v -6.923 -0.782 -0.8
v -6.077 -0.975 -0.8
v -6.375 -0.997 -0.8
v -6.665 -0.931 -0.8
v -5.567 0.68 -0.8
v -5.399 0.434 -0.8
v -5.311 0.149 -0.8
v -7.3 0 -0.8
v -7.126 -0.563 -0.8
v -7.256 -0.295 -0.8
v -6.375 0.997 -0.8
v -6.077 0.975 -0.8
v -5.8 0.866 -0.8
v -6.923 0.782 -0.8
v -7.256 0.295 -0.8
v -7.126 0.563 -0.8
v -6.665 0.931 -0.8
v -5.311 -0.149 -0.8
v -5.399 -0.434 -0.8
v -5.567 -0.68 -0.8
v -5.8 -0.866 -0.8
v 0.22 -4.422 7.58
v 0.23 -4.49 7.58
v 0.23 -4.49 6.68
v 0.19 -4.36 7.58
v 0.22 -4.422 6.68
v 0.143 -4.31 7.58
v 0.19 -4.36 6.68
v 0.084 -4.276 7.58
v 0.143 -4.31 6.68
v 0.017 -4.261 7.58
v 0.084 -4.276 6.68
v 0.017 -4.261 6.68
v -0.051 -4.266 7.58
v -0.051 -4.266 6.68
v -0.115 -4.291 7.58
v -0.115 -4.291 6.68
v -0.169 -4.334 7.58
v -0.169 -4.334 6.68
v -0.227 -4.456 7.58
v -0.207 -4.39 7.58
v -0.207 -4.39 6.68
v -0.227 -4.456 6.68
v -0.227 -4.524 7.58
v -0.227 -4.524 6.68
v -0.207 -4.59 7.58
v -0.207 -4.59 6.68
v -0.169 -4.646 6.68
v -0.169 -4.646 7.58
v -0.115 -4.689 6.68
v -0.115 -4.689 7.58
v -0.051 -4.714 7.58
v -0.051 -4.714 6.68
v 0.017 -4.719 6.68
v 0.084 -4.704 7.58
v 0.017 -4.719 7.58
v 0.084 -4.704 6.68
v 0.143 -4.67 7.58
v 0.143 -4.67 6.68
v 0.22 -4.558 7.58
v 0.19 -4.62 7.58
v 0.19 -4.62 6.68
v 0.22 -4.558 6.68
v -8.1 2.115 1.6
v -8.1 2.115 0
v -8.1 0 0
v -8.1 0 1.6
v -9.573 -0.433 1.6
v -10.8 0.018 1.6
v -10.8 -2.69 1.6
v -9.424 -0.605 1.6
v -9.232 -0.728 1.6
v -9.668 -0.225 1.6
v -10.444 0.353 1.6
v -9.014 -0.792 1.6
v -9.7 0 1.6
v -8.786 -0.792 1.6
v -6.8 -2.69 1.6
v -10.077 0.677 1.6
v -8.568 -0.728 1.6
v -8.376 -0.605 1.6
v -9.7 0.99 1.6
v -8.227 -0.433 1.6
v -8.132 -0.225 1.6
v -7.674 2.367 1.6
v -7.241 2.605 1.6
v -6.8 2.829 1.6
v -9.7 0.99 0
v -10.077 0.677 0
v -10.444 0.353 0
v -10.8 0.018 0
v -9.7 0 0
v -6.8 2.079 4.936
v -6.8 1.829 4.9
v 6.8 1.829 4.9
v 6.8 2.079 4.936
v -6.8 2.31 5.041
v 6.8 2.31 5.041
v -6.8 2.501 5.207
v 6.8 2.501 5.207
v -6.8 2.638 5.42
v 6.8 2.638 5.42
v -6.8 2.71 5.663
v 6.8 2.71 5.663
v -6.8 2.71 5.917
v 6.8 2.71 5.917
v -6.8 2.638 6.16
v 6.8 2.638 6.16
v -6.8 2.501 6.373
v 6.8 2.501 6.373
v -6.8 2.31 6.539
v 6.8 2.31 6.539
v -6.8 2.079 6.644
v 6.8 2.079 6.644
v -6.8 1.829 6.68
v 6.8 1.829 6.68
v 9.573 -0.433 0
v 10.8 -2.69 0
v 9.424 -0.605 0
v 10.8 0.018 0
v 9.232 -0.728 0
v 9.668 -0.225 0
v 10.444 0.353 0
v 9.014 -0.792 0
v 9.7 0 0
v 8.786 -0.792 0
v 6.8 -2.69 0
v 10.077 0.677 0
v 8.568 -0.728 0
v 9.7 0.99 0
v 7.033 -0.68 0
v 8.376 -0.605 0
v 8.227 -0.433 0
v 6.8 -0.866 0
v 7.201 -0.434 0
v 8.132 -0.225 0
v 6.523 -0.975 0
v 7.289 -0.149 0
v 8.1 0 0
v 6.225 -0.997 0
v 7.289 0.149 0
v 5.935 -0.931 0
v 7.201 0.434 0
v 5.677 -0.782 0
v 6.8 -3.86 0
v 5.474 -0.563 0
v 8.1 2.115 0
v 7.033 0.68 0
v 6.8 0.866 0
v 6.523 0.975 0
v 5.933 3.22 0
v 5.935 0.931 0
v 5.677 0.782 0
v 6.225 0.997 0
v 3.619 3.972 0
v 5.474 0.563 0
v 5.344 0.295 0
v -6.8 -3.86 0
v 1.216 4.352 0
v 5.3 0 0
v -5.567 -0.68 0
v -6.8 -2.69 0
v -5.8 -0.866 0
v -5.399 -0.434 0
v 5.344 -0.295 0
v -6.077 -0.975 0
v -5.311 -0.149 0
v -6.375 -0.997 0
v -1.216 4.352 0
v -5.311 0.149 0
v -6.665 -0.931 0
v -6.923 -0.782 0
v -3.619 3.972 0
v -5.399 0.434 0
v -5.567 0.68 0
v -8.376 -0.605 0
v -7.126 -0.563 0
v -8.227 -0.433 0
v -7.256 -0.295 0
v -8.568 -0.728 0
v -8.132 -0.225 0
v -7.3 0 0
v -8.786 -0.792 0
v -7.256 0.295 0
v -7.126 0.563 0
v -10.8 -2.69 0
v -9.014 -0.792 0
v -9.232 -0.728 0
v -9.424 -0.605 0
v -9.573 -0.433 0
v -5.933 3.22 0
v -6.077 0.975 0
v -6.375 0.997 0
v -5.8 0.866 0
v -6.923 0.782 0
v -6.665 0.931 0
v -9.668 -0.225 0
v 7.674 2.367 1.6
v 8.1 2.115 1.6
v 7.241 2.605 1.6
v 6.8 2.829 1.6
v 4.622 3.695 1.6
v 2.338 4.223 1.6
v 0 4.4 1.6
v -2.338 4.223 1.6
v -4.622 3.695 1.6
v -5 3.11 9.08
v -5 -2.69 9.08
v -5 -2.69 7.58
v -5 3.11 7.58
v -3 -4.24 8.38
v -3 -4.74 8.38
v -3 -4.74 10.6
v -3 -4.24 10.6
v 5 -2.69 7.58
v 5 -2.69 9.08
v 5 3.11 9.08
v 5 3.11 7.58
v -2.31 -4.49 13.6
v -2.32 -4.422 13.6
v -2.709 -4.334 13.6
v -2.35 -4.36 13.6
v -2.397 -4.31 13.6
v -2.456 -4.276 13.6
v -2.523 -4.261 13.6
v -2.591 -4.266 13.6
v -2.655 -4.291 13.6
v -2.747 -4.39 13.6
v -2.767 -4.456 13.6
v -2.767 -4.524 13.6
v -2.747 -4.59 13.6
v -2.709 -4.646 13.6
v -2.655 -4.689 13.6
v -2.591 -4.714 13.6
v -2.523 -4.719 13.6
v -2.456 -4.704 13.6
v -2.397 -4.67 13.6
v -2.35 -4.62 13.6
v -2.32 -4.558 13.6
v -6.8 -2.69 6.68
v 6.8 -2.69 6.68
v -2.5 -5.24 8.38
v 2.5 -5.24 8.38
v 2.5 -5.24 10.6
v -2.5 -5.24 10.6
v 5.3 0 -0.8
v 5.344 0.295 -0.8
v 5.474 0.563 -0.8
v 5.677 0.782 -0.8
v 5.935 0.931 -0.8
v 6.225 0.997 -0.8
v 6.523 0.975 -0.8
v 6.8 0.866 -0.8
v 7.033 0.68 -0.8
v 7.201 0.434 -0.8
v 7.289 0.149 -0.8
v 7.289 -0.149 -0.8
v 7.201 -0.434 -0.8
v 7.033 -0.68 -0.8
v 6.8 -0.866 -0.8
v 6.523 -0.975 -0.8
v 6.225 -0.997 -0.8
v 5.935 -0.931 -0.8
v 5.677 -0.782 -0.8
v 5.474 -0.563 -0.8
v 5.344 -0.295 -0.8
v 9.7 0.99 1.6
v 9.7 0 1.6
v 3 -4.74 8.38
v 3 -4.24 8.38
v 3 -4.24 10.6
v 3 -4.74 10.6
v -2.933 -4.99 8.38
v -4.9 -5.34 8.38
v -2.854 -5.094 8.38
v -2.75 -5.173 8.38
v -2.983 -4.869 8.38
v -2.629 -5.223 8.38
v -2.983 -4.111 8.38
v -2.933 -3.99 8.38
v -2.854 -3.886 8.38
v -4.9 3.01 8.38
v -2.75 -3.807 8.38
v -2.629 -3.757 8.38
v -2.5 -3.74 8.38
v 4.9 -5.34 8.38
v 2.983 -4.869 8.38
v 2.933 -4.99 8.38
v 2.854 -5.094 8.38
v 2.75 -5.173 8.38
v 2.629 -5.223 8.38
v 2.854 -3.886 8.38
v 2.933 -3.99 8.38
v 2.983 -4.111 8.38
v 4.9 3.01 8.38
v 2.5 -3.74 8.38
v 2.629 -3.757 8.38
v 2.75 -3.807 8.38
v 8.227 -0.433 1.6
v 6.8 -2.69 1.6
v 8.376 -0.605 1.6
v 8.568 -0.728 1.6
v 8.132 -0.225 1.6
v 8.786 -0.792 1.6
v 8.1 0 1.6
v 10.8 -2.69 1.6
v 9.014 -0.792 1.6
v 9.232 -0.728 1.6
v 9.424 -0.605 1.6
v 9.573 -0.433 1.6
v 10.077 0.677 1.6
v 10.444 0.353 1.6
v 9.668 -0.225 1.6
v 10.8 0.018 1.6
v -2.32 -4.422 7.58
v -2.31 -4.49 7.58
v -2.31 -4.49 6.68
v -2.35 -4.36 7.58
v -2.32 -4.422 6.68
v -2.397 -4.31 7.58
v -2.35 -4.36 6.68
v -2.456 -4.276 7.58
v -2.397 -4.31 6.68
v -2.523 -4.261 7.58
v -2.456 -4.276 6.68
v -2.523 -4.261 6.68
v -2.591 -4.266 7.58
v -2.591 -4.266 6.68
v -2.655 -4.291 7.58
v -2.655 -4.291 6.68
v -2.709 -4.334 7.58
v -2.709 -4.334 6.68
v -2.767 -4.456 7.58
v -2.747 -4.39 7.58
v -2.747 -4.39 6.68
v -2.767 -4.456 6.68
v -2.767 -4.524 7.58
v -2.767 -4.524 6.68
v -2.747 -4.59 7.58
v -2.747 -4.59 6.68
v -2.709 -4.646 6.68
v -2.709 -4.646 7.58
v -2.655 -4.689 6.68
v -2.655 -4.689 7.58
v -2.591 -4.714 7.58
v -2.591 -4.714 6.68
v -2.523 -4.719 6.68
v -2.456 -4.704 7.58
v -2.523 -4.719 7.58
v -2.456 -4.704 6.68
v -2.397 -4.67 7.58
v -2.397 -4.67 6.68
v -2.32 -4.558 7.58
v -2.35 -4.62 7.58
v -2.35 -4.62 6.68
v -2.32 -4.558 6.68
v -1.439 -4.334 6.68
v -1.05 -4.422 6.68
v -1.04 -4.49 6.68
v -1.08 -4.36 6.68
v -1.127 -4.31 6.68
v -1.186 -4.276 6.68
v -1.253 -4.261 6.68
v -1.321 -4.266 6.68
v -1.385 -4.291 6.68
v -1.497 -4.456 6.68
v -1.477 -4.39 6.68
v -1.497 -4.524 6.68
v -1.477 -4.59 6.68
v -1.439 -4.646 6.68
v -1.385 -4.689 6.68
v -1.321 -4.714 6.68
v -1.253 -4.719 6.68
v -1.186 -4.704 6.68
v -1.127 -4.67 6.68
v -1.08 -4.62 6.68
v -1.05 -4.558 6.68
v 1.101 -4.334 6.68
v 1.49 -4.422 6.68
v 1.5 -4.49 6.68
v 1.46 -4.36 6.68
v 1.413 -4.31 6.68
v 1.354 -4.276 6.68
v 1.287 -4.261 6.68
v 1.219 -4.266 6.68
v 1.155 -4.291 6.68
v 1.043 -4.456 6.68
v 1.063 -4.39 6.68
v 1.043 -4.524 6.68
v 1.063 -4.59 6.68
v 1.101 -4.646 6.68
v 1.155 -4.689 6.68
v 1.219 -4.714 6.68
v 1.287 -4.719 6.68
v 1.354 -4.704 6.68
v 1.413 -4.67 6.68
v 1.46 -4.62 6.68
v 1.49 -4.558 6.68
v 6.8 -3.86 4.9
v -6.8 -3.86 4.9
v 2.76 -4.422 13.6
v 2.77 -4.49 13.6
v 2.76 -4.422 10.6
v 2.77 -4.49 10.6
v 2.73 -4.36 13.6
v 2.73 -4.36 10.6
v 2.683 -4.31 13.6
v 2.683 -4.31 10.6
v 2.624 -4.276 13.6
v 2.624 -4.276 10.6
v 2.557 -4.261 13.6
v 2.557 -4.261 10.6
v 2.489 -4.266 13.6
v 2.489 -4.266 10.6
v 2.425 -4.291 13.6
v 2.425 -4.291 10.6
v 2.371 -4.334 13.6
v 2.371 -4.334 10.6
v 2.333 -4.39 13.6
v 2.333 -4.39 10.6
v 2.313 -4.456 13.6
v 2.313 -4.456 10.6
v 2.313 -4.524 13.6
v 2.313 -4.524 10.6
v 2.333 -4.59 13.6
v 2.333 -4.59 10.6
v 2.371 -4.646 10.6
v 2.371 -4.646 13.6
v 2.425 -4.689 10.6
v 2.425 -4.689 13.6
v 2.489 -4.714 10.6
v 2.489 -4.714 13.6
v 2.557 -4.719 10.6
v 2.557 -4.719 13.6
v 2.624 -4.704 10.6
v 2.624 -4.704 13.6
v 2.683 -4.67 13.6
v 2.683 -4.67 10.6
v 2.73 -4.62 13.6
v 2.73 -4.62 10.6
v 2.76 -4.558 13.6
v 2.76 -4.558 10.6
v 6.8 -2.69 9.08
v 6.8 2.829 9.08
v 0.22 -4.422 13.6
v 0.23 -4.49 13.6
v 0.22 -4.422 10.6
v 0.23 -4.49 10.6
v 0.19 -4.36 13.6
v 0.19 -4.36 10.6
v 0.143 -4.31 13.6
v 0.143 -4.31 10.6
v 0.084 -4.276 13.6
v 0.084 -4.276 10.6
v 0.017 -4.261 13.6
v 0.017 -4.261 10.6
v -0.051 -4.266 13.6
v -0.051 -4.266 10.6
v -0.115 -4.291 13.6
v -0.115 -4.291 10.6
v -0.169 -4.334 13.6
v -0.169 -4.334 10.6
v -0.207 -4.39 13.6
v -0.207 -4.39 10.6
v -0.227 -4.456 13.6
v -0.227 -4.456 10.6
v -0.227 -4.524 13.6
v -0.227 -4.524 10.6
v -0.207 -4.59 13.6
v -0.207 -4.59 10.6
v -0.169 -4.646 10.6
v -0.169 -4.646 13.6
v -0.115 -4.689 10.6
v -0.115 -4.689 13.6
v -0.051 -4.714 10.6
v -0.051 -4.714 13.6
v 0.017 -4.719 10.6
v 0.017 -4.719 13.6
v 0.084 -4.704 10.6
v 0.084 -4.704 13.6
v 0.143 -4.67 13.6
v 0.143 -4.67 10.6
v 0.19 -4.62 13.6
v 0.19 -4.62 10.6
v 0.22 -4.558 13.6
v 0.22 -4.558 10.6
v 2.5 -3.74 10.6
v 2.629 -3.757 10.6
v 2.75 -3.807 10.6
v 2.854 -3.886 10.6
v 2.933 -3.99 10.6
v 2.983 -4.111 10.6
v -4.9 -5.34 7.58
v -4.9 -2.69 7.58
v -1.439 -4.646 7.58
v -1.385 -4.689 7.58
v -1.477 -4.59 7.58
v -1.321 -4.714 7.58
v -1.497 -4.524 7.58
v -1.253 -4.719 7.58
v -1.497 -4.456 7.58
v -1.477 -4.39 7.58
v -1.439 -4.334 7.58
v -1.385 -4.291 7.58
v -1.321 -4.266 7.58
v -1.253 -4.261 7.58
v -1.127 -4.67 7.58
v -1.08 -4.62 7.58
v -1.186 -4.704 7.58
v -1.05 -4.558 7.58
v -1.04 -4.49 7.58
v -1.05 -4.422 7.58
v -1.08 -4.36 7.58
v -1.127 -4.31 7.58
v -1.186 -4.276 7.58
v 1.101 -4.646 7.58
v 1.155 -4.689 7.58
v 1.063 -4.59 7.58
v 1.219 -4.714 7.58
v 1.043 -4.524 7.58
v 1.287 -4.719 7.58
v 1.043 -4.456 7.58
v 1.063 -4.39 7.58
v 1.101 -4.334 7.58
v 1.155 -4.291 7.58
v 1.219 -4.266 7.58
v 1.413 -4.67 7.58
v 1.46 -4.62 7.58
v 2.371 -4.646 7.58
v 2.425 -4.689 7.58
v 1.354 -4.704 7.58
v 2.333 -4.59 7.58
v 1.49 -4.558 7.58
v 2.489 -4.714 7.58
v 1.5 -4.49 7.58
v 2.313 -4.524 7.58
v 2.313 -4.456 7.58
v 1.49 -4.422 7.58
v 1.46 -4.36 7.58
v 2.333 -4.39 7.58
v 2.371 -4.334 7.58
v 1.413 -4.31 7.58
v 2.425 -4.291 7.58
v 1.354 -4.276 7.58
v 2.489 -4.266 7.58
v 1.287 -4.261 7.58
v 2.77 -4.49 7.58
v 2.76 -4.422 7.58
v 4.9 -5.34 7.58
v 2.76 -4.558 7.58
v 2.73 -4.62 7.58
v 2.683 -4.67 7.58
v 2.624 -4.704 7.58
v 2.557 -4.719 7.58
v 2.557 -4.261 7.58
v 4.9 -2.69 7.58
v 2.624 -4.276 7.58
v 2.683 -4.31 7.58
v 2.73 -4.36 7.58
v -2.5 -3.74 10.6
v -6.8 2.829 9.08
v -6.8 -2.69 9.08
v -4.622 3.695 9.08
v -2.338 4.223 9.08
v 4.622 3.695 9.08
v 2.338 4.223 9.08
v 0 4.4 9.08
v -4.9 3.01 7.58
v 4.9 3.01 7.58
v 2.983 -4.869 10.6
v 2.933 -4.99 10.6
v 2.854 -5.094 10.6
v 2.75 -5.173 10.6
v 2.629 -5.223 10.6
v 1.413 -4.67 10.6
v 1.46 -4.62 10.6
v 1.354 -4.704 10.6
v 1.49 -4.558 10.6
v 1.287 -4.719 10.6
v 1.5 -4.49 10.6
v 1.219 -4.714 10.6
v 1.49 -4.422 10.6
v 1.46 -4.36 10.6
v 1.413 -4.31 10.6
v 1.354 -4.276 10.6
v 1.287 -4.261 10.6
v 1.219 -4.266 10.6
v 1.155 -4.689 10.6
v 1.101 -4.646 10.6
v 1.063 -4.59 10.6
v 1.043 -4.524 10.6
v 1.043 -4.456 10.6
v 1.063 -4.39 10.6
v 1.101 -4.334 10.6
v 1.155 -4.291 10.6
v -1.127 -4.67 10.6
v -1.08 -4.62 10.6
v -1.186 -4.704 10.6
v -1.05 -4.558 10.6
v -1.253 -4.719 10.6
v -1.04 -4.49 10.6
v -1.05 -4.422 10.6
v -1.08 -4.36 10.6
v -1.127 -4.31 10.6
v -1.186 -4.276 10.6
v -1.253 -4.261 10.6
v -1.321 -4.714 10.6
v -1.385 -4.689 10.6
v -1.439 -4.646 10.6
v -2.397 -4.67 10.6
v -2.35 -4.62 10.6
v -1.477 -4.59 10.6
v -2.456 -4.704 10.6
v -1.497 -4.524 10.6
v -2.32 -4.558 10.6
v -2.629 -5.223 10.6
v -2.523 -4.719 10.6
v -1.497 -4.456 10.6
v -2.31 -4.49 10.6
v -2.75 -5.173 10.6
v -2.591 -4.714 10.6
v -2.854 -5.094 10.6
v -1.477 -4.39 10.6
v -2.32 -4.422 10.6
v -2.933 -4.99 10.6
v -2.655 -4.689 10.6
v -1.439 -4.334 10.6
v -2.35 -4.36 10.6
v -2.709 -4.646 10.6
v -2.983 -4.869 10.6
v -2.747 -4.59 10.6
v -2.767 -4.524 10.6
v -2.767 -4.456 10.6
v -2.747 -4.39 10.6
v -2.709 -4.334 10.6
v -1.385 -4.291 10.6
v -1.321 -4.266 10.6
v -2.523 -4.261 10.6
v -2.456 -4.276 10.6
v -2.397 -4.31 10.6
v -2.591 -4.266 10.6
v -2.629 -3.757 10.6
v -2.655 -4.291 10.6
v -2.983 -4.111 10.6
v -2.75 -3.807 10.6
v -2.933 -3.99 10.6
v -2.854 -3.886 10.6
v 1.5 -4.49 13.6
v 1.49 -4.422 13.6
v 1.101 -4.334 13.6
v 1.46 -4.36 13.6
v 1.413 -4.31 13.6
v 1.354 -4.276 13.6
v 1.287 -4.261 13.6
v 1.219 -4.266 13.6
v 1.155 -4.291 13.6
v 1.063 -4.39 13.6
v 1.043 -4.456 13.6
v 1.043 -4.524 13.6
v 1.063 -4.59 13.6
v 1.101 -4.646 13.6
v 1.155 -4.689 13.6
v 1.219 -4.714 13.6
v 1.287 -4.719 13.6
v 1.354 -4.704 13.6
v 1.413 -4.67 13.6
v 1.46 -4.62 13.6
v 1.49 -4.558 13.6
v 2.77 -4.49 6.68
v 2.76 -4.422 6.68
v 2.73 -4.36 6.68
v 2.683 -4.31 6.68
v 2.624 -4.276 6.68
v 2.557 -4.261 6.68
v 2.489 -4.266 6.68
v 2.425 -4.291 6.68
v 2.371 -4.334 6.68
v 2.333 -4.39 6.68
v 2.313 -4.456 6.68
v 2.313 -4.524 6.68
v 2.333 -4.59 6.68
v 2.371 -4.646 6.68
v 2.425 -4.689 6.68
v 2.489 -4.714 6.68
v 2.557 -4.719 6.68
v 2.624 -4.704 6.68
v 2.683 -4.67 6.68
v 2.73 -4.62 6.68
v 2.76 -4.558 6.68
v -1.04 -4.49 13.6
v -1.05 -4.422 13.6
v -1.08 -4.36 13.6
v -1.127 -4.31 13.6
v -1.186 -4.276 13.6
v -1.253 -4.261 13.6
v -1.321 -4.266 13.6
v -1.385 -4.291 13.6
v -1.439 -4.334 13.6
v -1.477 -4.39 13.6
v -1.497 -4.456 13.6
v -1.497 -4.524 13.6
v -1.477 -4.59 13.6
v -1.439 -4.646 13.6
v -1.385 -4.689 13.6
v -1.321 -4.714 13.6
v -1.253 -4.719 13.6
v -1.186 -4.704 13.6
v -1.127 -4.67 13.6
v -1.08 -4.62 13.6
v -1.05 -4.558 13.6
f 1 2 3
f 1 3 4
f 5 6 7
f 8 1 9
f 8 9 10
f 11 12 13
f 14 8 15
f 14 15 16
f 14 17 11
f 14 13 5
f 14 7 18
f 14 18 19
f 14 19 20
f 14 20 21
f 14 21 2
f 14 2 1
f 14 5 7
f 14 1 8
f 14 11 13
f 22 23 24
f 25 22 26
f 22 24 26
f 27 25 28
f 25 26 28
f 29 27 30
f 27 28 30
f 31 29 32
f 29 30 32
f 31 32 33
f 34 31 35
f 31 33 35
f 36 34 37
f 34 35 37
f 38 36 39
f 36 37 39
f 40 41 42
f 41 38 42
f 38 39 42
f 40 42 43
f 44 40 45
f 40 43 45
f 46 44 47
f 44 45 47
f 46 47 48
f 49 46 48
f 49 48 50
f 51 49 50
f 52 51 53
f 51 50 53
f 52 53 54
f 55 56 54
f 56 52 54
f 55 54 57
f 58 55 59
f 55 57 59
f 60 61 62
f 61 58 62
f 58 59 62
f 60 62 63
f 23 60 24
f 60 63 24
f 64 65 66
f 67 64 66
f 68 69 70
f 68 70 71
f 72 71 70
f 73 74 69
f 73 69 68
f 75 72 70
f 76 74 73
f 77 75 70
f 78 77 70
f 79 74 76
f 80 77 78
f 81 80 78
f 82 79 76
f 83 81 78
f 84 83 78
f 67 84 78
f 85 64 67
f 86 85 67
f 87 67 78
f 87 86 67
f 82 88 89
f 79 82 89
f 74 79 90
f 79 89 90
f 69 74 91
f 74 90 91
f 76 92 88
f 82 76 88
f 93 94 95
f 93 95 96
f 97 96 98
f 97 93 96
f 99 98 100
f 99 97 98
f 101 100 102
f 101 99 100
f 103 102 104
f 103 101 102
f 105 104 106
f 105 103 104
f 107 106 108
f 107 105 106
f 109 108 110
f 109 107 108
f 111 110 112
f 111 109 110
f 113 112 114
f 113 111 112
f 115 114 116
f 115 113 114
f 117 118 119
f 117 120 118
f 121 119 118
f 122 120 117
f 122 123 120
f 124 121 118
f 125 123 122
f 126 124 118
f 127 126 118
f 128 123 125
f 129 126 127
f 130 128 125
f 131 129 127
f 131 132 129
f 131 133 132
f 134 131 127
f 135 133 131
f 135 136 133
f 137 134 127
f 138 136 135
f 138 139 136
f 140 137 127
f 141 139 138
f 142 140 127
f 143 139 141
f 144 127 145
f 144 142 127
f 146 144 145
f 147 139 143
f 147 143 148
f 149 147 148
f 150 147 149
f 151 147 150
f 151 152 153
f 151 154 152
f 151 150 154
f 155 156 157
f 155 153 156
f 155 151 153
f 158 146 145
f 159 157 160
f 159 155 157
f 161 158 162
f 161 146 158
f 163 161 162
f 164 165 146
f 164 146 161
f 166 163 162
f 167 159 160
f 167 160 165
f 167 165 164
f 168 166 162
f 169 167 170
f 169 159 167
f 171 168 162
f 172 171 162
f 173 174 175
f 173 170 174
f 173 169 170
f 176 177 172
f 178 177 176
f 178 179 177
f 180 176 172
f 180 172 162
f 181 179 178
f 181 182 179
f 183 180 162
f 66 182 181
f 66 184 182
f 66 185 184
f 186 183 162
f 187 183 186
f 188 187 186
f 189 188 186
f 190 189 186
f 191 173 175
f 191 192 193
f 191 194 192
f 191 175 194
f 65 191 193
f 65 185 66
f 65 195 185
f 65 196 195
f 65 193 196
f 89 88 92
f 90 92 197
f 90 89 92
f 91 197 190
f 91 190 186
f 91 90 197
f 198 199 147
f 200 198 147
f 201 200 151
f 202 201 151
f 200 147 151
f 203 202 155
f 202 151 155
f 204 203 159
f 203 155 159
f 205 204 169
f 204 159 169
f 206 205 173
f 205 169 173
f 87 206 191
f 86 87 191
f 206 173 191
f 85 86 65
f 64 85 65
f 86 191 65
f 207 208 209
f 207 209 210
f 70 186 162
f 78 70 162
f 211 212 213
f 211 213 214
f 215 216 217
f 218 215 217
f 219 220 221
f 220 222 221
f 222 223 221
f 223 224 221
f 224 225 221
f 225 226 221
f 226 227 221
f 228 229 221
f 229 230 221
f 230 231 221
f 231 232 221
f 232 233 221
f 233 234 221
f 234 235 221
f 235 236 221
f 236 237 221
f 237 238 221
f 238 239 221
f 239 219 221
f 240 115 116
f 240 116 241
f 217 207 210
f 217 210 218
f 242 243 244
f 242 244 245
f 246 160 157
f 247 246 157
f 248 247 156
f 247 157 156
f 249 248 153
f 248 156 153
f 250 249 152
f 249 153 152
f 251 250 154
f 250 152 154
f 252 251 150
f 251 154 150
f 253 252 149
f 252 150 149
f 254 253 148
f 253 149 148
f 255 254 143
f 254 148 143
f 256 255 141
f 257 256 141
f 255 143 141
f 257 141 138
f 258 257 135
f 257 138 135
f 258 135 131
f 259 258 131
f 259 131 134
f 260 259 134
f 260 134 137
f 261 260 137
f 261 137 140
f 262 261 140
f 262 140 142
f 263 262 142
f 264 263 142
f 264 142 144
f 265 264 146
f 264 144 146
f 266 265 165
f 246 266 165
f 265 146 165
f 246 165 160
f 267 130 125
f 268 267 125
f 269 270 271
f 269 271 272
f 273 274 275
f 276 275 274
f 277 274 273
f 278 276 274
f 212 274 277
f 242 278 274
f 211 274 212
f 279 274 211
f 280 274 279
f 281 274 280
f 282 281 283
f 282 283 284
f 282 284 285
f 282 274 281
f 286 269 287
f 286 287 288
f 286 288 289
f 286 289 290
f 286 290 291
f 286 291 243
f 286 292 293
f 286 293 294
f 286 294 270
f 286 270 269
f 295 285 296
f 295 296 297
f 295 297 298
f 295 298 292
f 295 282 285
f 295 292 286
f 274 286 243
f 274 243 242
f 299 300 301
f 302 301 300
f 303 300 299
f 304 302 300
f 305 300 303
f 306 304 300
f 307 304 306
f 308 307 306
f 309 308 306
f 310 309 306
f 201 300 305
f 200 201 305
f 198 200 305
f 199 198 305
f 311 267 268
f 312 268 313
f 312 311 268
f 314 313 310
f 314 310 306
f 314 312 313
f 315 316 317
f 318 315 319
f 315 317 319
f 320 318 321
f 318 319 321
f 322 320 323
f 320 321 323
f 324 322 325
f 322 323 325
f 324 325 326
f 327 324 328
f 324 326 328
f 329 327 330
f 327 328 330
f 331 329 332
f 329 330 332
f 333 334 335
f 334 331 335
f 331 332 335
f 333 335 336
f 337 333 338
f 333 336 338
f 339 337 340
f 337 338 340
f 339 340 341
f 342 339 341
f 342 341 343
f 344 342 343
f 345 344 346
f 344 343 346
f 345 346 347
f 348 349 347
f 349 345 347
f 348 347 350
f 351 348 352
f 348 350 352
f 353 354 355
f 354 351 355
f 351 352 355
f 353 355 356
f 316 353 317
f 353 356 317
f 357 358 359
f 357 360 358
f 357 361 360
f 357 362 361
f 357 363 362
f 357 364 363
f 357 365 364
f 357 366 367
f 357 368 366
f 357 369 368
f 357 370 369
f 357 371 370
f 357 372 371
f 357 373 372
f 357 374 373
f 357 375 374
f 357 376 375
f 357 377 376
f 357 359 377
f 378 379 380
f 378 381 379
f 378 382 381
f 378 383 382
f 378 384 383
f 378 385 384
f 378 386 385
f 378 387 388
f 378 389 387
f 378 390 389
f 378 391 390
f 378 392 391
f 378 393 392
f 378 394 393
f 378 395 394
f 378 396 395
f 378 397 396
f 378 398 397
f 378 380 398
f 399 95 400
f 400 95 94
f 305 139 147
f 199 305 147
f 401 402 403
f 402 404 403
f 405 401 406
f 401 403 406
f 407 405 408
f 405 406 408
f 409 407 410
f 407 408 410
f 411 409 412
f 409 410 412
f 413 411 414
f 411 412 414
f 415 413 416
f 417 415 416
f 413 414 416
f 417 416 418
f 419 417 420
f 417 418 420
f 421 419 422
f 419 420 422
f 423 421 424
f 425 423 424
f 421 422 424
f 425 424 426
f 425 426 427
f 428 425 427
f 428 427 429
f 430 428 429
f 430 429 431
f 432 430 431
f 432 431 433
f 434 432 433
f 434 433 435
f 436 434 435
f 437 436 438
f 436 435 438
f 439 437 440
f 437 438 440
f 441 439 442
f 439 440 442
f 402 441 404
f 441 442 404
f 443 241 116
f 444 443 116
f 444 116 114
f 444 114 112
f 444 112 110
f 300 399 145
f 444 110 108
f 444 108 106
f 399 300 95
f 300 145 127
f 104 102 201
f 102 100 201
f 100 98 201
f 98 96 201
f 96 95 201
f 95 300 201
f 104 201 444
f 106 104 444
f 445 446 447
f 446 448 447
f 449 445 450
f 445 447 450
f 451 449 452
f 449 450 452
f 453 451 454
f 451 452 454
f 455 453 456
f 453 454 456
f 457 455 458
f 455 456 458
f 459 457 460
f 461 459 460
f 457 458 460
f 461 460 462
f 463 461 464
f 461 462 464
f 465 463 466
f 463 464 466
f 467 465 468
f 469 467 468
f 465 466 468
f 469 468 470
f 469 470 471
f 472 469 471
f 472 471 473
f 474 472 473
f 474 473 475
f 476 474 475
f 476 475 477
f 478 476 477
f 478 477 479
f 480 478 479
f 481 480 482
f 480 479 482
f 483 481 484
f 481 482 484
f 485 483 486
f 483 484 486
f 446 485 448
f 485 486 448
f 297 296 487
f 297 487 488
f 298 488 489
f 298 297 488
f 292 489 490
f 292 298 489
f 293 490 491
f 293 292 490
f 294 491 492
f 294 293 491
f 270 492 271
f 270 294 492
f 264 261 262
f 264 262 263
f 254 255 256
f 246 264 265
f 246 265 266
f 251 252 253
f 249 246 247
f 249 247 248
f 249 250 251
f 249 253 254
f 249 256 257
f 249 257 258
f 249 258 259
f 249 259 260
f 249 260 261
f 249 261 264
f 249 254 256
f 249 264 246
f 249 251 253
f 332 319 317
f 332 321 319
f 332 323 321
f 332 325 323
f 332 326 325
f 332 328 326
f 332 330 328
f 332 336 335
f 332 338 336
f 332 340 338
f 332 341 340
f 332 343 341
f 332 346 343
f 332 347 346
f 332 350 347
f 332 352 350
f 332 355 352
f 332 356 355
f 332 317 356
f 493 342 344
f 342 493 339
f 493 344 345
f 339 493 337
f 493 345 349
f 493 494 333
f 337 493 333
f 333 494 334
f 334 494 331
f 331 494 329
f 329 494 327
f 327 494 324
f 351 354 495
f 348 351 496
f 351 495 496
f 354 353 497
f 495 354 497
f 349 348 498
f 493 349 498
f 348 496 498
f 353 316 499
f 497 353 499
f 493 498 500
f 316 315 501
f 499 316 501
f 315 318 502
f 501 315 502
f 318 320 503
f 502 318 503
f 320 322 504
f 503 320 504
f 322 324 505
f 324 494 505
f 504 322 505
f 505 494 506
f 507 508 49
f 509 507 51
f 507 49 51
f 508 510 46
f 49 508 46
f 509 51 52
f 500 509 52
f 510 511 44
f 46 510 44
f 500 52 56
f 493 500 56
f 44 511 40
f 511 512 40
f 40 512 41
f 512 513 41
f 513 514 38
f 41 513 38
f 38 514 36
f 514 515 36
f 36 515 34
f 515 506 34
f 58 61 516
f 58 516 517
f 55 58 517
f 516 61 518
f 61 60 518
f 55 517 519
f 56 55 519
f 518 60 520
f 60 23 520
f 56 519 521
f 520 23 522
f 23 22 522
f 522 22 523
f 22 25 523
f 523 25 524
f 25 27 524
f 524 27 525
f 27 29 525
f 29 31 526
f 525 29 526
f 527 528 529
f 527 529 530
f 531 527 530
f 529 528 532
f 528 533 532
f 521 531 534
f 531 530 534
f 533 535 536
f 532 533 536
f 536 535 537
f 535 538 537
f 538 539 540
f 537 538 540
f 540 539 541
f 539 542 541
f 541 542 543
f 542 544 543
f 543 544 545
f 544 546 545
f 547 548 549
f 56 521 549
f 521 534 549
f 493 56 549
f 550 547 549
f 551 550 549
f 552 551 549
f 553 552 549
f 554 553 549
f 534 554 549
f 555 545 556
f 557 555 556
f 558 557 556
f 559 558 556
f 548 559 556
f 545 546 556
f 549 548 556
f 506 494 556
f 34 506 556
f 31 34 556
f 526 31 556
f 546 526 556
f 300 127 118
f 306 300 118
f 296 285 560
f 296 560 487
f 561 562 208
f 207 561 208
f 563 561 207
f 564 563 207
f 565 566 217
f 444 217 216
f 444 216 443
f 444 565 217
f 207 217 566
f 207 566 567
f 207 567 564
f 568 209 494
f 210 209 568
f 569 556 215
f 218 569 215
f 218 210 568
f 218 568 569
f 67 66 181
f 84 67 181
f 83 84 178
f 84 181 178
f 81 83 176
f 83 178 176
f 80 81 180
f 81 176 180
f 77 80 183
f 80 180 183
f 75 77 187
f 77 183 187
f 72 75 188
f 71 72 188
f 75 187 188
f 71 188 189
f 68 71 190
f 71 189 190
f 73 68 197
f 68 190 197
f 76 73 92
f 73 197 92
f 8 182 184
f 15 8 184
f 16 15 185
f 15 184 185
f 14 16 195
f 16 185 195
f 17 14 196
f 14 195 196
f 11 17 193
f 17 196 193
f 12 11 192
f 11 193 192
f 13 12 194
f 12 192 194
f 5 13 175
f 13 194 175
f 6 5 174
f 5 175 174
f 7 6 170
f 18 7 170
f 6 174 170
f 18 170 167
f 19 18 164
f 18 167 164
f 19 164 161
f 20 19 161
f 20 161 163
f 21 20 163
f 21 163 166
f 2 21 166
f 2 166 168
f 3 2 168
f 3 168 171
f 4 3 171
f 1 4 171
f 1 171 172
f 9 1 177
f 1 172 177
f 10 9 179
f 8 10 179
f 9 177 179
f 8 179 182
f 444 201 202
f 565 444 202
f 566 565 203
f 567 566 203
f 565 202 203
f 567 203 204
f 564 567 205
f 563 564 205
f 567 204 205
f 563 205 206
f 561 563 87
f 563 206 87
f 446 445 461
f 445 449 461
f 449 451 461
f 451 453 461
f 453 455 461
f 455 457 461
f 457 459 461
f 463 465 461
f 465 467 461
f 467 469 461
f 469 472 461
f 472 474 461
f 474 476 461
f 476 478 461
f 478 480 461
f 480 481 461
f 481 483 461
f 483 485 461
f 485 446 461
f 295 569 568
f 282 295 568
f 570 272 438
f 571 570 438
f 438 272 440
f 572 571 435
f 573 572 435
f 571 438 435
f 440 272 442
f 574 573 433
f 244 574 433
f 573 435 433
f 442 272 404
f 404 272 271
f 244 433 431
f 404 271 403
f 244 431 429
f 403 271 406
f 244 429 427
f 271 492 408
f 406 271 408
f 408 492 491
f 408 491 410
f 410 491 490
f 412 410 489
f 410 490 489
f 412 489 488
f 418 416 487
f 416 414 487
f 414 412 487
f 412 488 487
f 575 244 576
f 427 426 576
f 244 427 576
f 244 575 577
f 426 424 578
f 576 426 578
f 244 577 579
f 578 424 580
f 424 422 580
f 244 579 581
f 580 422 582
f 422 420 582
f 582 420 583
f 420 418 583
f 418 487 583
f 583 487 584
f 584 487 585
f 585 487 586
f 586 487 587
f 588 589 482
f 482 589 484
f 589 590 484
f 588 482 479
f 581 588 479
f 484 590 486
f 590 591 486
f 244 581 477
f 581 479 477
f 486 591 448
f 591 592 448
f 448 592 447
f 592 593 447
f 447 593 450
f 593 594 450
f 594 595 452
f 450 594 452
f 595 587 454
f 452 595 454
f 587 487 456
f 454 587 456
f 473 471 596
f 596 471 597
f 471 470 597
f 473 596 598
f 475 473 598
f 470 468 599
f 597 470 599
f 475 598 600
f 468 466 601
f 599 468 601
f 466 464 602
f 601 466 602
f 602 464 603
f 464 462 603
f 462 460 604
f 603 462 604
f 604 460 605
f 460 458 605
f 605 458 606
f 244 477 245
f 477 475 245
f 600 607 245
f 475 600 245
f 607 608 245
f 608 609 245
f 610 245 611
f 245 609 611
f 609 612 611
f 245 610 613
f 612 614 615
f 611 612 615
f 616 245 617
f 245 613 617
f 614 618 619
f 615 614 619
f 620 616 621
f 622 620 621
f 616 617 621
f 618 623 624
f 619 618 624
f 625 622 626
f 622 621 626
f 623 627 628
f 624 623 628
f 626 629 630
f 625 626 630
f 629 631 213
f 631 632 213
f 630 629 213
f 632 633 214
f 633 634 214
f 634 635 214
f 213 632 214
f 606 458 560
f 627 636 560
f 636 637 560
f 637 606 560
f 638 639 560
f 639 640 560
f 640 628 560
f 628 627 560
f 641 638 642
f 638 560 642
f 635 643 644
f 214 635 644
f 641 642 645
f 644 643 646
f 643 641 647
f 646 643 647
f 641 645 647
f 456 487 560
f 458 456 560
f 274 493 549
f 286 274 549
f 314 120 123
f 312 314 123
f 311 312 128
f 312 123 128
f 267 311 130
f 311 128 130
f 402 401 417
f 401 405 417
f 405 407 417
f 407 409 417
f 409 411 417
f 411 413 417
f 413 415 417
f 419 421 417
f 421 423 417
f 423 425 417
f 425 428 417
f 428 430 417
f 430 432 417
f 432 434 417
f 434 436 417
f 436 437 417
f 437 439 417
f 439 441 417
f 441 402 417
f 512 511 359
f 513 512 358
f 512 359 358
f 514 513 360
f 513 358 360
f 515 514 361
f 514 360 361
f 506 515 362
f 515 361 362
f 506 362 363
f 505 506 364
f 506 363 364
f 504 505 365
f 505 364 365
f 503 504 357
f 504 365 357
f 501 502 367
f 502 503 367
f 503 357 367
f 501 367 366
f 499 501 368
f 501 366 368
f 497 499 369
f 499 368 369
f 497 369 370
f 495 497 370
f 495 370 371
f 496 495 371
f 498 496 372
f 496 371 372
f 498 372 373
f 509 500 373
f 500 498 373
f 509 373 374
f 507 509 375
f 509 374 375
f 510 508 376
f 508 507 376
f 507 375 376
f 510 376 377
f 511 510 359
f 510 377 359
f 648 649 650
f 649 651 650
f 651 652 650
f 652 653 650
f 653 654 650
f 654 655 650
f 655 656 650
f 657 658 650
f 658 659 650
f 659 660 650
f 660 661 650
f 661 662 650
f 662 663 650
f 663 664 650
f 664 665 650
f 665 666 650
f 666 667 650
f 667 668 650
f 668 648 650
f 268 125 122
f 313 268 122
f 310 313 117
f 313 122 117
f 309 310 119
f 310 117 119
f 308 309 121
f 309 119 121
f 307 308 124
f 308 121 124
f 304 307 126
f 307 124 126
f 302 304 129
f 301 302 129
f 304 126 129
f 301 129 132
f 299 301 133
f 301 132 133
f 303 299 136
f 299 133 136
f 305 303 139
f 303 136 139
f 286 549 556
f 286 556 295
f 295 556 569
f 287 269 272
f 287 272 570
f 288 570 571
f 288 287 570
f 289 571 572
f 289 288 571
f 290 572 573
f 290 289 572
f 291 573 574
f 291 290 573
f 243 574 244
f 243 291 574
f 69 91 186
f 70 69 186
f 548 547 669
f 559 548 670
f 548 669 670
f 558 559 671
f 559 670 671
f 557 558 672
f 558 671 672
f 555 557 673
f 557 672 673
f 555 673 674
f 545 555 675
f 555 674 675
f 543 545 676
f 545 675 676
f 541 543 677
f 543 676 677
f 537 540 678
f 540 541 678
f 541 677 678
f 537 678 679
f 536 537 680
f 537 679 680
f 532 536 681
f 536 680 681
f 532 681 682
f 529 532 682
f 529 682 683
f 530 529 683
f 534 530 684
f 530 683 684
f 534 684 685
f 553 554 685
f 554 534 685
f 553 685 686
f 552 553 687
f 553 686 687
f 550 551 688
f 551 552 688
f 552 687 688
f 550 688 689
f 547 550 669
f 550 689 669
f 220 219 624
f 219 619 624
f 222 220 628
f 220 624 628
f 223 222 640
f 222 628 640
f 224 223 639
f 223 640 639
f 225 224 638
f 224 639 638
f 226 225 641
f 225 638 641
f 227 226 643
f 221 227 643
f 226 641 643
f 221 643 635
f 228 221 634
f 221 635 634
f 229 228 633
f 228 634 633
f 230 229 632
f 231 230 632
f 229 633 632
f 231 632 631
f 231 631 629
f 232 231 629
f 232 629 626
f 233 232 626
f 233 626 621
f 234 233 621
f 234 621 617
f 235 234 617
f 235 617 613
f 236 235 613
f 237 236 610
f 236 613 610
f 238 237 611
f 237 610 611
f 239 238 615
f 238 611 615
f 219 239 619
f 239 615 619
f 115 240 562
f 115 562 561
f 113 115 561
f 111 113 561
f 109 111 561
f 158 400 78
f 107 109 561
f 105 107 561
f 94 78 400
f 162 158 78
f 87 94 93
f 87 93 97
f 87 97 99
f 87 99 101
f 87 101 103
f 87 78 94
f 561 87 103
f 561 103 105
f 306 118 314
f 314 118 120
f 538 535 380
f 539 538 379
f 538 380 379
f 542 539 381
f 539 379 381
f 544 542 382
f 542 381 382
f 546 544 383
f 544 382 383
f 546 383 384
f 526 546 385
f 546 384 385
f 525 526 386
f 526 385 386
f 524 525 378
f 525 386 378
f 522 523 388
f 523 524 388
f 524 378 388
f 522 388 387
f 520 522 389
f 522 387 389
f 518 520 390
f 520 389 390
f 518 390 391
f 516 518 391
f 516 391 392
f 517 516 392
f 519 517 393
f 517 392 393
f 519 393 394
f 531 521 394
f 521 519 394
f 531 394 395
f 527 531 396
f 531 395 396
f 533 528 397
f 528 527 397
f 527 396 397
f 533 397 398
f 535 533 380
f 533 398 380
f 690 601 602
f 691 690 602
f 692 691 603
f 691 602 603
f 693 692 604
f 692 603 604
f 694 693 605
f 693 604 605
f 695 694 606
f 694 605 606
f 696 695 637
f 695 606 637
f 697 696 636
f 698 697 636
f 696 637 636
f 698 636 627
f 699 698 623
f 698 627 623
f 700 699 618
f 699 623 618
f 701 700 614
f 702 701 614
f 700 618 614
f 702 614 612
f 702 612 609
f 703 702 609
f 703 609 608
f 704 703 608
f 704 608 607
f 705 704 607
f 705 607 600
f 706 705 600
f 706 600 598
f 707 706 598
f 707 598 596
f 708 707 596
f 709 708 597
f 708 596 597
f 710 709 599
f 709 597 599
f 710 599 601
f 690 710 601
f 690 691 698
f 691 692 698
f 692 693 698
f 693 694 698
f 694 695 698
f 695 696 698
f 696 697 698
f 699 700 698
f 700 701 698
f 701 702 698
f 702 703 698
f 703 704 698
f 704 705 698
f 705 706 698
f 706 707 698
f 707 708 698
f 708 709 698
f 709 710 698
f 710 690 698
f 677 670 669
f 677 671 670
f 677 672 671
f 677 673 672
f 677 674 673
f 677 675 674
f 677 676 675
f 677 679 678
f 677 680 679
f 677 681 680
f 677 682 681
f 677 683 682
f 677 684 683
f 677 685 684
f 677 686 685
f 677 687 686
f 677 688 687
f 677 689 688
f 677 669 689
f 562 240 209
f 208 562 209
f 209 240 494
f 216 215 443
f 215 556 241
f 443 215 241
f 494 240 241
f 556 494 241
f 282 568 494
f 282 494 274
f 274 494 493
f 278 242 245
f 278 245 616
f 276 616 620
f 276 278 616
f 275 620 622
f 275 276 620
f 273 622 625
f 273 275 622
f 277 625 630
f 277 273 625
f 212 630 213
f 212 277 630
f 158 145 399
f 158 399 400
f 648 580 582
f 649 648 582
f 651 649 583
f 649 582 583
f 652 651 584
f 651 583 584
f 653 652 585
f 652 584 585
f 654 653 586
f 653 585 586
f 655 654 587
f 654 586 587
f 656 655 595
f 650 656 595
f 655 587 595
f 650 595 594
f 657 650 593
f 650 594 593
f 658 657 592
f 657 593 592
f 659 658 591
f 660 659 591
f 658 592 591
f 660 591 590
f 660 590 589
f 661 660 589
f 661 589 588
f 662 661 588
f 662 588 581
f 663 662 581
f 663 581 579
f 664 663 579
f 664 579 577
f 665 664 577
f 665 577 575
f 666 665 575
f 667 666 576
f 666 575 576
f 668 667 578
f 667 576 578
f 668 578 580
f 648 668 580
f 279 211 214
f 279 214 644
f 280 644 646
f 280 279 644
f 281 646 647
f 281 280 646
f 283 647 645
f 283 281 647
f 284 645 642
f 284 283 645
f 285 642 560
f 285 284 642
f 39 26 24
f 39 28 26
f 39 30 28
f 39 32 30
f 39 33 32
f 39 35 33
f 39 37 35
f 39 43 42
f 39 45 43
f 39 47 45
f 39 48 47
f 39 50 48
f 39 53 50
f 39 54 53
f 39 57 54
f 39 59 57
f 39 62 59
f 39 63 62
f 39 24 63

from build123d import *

# Parameters (mm, degrees)
BOSS_EXTRU_1_DEPTH           = 1.6
BOSS_EXTRU_2_DEPTH           = 7.48
ESQUISSE3_W                  = 10
ESQUISSE3_H                  = 5.8
ENL_V_MAT_EXTRU_2_DEPTH      = 1.5
ENL_V_MAT_EXTRU_3_DEPTH      = 18.6
ESQUISSE5_R                  = 1
BOSS_EXTRU_3_DEPTH           = 0.8
ESQUISSE8_W                  = 0.23
ESQUISSE8_H                  = 6.92
R_P_TITION_LIN_AIRE1_COUNT   = 3
R_P_TITION_LIN_AIRE1_PITCH   = 1.27
R_P_TITION_LIN_AIRE1_2_COUNT = 3
R_P_TITION_LIN_AIRE1_2_PITCH = 1.27
BOSS_EXTRU_4_DEPTH           = 0.8
ESQUISSE11_W                 = 13.6
ESQUISSE11_H                 = 1.17
BOSS_EXTRU_5_DEPTH           = 4.9
BOSS_EXTRU_6_DEPTH           = 2.22


with BuildPart() as part:
    # Esquisse1 → Boss.-Extru.1 (new body)
    with BuildSketch(Plane.XY):
        with BuildLine():
            Line((-10.8, 0.018003418), (-10.8, -2.69))
            Line((-10.8, -2.69), (10.8, -2.69))
            Line((10.8, -2.69), (10.8, 0.018003418))
            ThreePointArc((10.8, 0.018003418), (10.261507275, 0.516861385), (9.7, 0.989665008))
            Line((9.7, 0.989665008), (9.7, 0))
            ThreePointArc((9.7, 0), (8.9, -0.8), (8.1, 0))
            Line((8.1, 0), (8.1, 2.115142829))
            ThreePointArc((8.1, 2.115142829), (0, 4.4), (-8.1, 2.115142829))
            Line((-8.1, 2.115142829), (-8.1, 0))
            ThreePointArc((-8.1, 0), (-8.9, -0.8), (-9.7, 0))
            Line((-9.7, 0), (-9.7, 0.989665008))
            ThreePointArc((-9.7, 0.989665008), (-10.261507275, 0.516861385), (-10.8, 0.018003418))
        make_face()
    extrude(amount=BOSS_EXTRU_1_DEPTH)

    # Esquisse2 → Boss.-Extru.2 (add)
    with BuildSketch(Plane.XY.offset(1.6)):
        with BuildLine():
            Line((-6.8, 2.828747252), (-6.8, -2.69))
            Line((-6.8, -2.69), (6.8, -2.69))
            Line((6.8, -2.69), (6.8, 2.828747252))
            ThreePointArc((6.8, 2.828747252), (0, 4.4), (-6.8, 2.828747252))
        make_face()
    extrude(amount=BOSS_EXTRU_2_DEPTH)

    # Esquisse3 → Enlèv. mat.-Extru.2 (cut)
    with BuildSketch(Plane.XY.offset(9.08)):
        with Locations((0, 0.21)):
            Rectangle(ESQUISSE3_W, ESQUISSE3_H)
    extrude(amount=-ENL_V_MAT_EXTRU_2_DEPTH, mode=Mode.SUBTRACT)

    # Esquisse4 → Enlèv. mat.-Extru.3 (cut, through all)
    with BuildSketch(Plane.ZY.offset(6.8)):
        with BuildLine():
            Line((4.9, -2.69), (4.9, 1.828747252))
            ThreePointArc((4.9, 1.828747252), (5.79, 2.718747252), (6.68, 1.828747252))
            Line((6.68, 1.828747252), (6.68, -2.69))
            ThreePointArc((6.68, -2.69), (5.79, -3.58), (4.9, -2.69))
        make_face()
    extrude(amount=-ENL_V_MAT_EXTRU_3_DEPTH, mode=Mode.SUBTRACT)

    # Esquisse5 → Boss.-Extru.3 (add)
    with BuildSketch(Plane(origin=(0, 0, 0), x_dir=(-1, 0, 0), z_dir=(0, 0, -1))):
        with Locations((6.3, 0)):
            Circle(ESQUISSE5_R)
        with Locations((-6.3, 0)):
            Circle(ESQUISSE5_R)
    extrude(amount=BOSS_EXTRU_3_DEPTH)



with BuildPart() as body_2:
    # Esquisse8 → Révolution1 (revolve)
    with BuildSketch(Plane(origin=(0, -4.49, 0), x_dir=(1, 0, 0), z_dir=(0, 1, 0))):
        with Locations((0.115, -10.14)):
            Rectangle(ESQUISSE8_W, ESQUISSE8_H)
    revolve(axis=Axis((0, -4.49, 7.58), (0, 0, 1)))


with BuildPart() as r_p_tition_lin_aire1_1:
    # Répétition linéaire1: pattern copy
    add(body_2.part.moved(Location(Vector(1, 0, 0) * (1 * R_P_TITION_LIN_AIRE1_PITCH))))


with BuildPart() as r_p_tition_lin_aire1_2:
    # Répétition linéaire1: pattern copy
    add(body_2.part.moved(Location(Vector(1, 0, 0) * (2 * R_P_TITION_LIN_AIRE1_PITCH))))


with BuildPart() as r_p_tition_lin_aire1_2_1:
    # R_p_tition lin_aire1 2: pattern copy
    add(body_2.part.moved(Location(Vector(-1, 0, 0) * (1 * R_P_TITION_LIN_AIRE1_2_PITCH))))


with BuildPart() as r_p_tition_lin_aire1_2_2:
    # R_p_tition lin_aire1 2: pattern copy
    add(body_2.part.moved(Location(Vector(-1, 0, 0) * (2 * R_P_TITION_LIN_AIRE1_2_PITCH))))


with BuildPart() as r_p_tition_lin_aire1_2_3:
    # R_p_tition lin_aire1 2: pattern copy
    add(r_p_tition_lin_aire1_1.part.moved(Location(Vector(-1, 0, 0) * (1 * R_P_TITION_LIN_AIRE1_2_PITCH))))


with BuildPart() as r_p_tition_lin_aire1_2_4:
    # R_p_tition lin_aire1 2: pattern copy
    add(r_p_tition_lin_aire1_1.part.moved(Location(Vector(-1, 0, 0) * (2 * R_P_TITION_LIN_AIRE1_2_PITCH))))


with BuildPart() as r_p_tition_lin_aire1_2_5:
    # R_p_tition lin_aire1 2: pattern copy
    add(r_p_tition_lin_aire1_2.part.moved(Location(Vector(-1, 0, 0) * (1 * R_P_TITION_LIN_AIRE1_2_PITCH))))


with BuildPart() as r_p_tition_lin_aire1_2_6:
    # R_p_tition lin_aire1 2: pattern copy
    add(r_p_tition_lin_aire1_2.part.moved(Location(Vector(-1, 0, 0) * (2 * R_P_TITION_LIN_AIRE1_2_PITCH))))


with BuildPart() as part_1:
    add(part.part)

    add(body_2.part)  # Boss.-Extru.4 merges body 2

    add(r_p_tition_lin_aire1_1.part)  # Boss.-Extru.4 merges Répétition linéaire1_1

    add(r_p_tition_lin_aire1_2.part)  # Boss.-Extru.4 merges Répétition linéaire1_2

    add(r_p_tition_lin_aire1_2_1.part)  # Boss.-Extru.4 merges Répétition linéaire1 2_1

    add(r_p_tition_lin_aire1_2_2.part)  # Boss.-Extru.4 merges Répétition linéaire1 2_2

    add(r_p_tition_lin_aire1_2_3.part)  # Boss.-Extru.4 merges Répétition linéaire1 2_3

    add(r_p_tition_lin_aire1_2_4.part)  # Boss.-Extru.4 merges Répétition linéaire1 2_4

    add(r_p_tition_lin_aire1_2_5.part)  # Boss.-Extru.4 merges Répétition linéaire1 2_5

    add(r_p_tition_lin_aire1_2_6.part)  # Boss.-Extru.4 merges Répétition linéaire1 2_6
    # Esquisse10 → Boss.-Extru.4 (add)
    with BuildSketch(Plane.XY.offset(7.58)):
        Polygon((-4.9, -2.59), (-4.9, -5.34), (4.9, -5.34), (4.9, -2.59), (4.9, 3.01), (-4.9, 3.01), align=None)
    extrude(amount=BOSS_EXTRU_4_DEPTH)

    # Esquisse11 → Boss.-Extru.5 (add)
    with BuildSketch(Plane(origin=(0, 0, 0), x_dir=(-1, 0, 0), z_dir=(0, 0, -1))):
        with Locations((0, -3.275)):
            Rectangle(ESQUISSE11_W, ESQUISSE11_H)
    extrude(amount=-BOSS_EXTRU_5_DEPTH)

    # Esquisse12 → Boss.-Extru.6 (add)
    with BuildSketch(Plane.XY.offset(8.38)):
        with BuildLine():
            Line((2.5, -5.24), (-2.5, -5.24))
            ThreePointArc((-2.5, -5.24), (-2.853553391, -5.093553391), (-3, -4.74))
            Line((-3, -4.74), (-3, -4.24))
            ThreePointArc((-3, -4.24), (-2.853553391, -3.886446609), (-2.5, -3.74))
            Line((-2.5, -3.74), (2.5, -3.74))
            ThreePointArc((2.5, -3.74), (2.853553391, -3.886446609), (3, -4.24))
            Line((3, -4.24), (3, -4.74))
            ThreePointArc((3, -4.74), (2.853553391, -5.093553391), (2.5, -5.24))
        make_face()
    extrude(amount=BOSS_EXTRU_6_DEPTH)


solid = part_1.part
